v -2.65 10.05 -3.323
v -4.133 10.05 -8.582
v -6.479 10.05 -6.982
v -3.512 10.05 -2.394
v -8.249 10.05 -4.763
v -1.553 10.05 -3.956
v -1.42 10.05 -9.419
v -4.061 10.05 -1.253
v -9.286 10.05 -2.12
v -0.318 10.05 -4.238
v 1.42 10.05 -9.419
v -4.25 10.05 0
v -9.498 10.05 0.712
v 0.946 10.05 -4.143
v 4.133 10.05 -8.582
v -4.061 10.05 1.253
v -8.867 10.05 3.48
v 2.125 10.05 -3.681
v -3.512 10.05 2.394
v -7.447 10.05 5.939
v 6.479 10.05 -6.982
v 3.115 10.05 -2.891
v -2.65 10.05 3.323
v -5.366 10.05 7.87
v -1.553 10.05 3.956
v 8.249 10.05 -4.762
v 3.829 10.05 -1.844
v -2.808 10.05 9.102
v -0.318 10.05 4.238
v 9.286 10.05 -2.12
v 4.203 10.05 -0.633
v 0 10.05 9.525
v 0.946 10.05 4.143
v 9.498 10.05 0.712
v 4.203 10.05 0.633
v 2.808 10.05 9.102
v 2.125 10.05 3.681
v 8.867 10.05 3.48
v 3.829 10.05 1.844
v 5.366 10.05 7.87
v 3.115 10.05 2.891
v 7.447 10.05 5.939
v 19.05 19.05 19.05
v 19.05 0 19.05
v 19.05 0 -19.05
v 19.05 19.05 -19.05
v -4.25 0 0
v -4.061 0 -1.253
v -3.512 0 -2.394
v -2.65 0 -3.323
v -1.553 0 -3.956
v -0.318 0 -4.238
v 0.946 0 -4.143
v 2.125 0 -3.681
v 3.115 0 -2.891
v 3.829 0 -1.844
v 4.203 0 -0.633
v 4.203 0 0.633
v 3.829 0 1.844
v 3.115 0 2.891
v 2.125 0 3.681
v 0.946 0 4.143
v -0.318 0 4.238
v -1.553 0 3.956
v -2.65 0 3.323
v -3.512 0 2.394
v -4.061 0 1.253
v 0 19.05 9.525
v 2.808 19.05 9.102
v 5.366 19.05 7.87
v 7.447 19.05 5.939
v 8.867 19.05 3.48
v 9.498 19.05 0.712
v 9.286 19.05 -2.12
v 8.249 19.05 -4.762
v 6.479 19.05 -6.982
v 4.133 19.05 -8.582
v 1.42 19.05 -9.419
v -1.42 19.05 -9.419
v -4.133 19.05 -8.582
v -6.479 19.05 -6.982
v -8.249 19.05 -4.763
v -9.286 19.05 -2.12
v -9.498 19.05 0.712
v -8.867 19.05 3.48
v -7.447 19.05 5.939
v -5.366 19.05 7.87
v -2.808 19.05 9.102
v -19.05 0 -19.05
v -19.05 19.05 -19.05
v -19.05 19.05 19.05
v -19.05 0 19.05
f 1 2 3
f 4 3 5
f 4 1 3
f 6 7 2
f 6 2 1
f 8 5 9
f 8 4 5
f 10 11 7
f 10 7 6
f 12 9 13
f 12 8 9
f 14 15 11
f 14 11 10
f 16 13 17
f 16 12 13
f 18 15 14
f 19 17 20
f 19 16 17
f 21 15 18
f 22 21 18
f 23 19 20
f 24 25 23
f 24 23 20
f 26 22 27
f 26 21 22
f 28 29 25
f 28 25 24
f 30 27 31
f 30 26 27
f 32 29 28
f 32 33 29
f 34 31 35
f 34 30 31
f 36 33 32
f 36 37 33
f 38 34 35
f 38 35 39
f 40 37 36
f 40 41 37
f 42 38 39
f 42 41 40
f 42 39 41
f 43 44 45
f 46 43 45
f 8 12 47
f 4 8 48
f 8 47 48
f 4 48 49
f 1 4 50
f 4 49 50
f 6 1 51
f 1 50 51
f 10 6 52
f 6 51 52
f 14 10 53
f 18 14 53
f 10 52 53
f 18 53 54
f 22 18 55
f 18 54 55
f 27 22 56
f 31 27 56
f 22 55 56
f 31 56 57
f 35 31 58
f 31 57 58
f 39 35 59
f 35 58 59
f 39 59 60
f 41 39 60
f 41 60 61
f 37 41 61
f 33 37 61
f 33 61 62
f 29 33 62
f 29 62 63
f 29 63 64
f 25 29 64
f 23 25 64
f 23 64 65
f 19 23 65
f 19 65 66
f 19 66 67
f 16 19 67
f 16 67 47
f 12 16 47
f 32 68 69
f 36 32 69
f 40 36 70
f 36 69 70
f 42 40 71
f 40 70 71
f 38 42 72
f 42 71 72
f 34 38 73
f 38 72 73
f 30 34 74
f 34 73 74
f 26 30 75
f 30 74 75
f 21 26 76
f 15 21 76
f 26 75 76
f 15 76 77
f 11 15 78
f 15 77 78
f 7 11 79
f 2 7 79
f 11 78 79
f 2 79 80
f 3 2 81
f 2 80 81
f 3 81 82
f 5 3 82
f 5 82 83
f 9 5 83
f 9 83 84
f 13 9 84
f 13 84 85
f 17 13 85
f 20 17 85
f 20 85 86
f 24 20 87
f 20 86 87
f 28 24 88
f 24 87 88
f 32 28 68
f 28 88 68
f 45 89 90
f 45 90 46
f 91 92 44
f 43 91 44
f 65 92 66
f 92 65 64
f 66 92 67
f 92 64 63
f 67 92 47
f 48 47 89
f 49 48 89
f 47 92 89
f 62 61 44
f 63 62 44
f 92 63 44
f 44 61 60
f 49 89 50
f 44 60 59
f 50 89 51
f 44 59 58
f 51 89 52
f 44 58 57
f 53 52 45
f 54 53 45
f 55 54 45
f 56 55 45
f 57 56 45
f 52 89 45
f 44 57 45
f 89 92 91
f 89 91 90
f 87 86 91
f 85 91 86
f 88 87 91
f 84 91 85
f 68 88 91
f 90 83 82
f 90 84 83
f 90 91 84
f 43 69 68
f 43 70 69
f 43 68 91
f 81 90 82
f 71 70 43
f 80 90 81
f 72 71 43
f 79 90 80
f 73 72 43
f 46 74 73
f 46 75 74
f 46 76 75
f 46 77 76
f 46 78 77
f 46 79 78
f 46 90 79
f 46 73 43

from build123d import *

# Parameters (mm, degrees)
SKETCH1_W              = 38.1
SKETCH1_H              = 38.1
BOSS_EXTRUDE1_DEPTH    = 19.05
M10X1_5_TAPPED_HOLE1_D = 8.5
SKETCH5_R              = 9.525
CUT_EXTRUDE1_DEPTH     = 9


with BuildPart() as part:
    # Sketch1 → Boss-Extrude1 (new body)
    with BuildSketch(Plane(origin=(0, 0, 0), x_dir=(1, 0, 0), z_dir=(0, 1, 0))):
        Rectangle(SKETCH1_W, SKETCH1_H)
    extrude(amount=BOSS_EXTRUDE1_DEPTH)

    # M10x1.5 Tapped Hole1 (through all)
    with Locations(Plane(origin=(0, 19.05, 0), x_dir=(1, 0, 0), z_dir=(0, 1, 0))):
        with Locations((0, 0)):
            Hole(M10X1_5_TAPPED_HOLE1_D / 2)

    # Sketch5 → Cut-Extrude1 (cut)
    with BuildSketch(Plane(origin=(0, 19.05, 0), x_dir=(1, 0, 0), z_dir=(0, 1, 0))):
        with Locations(Location((0, 0, 0), (0, 0, 270))):
            Circle(SKETCH5_R)
    extrude(amount=-CUT_EXTRUDE1_DEPTH, mode=Mode.SUBTRACT)


solid = part.part
